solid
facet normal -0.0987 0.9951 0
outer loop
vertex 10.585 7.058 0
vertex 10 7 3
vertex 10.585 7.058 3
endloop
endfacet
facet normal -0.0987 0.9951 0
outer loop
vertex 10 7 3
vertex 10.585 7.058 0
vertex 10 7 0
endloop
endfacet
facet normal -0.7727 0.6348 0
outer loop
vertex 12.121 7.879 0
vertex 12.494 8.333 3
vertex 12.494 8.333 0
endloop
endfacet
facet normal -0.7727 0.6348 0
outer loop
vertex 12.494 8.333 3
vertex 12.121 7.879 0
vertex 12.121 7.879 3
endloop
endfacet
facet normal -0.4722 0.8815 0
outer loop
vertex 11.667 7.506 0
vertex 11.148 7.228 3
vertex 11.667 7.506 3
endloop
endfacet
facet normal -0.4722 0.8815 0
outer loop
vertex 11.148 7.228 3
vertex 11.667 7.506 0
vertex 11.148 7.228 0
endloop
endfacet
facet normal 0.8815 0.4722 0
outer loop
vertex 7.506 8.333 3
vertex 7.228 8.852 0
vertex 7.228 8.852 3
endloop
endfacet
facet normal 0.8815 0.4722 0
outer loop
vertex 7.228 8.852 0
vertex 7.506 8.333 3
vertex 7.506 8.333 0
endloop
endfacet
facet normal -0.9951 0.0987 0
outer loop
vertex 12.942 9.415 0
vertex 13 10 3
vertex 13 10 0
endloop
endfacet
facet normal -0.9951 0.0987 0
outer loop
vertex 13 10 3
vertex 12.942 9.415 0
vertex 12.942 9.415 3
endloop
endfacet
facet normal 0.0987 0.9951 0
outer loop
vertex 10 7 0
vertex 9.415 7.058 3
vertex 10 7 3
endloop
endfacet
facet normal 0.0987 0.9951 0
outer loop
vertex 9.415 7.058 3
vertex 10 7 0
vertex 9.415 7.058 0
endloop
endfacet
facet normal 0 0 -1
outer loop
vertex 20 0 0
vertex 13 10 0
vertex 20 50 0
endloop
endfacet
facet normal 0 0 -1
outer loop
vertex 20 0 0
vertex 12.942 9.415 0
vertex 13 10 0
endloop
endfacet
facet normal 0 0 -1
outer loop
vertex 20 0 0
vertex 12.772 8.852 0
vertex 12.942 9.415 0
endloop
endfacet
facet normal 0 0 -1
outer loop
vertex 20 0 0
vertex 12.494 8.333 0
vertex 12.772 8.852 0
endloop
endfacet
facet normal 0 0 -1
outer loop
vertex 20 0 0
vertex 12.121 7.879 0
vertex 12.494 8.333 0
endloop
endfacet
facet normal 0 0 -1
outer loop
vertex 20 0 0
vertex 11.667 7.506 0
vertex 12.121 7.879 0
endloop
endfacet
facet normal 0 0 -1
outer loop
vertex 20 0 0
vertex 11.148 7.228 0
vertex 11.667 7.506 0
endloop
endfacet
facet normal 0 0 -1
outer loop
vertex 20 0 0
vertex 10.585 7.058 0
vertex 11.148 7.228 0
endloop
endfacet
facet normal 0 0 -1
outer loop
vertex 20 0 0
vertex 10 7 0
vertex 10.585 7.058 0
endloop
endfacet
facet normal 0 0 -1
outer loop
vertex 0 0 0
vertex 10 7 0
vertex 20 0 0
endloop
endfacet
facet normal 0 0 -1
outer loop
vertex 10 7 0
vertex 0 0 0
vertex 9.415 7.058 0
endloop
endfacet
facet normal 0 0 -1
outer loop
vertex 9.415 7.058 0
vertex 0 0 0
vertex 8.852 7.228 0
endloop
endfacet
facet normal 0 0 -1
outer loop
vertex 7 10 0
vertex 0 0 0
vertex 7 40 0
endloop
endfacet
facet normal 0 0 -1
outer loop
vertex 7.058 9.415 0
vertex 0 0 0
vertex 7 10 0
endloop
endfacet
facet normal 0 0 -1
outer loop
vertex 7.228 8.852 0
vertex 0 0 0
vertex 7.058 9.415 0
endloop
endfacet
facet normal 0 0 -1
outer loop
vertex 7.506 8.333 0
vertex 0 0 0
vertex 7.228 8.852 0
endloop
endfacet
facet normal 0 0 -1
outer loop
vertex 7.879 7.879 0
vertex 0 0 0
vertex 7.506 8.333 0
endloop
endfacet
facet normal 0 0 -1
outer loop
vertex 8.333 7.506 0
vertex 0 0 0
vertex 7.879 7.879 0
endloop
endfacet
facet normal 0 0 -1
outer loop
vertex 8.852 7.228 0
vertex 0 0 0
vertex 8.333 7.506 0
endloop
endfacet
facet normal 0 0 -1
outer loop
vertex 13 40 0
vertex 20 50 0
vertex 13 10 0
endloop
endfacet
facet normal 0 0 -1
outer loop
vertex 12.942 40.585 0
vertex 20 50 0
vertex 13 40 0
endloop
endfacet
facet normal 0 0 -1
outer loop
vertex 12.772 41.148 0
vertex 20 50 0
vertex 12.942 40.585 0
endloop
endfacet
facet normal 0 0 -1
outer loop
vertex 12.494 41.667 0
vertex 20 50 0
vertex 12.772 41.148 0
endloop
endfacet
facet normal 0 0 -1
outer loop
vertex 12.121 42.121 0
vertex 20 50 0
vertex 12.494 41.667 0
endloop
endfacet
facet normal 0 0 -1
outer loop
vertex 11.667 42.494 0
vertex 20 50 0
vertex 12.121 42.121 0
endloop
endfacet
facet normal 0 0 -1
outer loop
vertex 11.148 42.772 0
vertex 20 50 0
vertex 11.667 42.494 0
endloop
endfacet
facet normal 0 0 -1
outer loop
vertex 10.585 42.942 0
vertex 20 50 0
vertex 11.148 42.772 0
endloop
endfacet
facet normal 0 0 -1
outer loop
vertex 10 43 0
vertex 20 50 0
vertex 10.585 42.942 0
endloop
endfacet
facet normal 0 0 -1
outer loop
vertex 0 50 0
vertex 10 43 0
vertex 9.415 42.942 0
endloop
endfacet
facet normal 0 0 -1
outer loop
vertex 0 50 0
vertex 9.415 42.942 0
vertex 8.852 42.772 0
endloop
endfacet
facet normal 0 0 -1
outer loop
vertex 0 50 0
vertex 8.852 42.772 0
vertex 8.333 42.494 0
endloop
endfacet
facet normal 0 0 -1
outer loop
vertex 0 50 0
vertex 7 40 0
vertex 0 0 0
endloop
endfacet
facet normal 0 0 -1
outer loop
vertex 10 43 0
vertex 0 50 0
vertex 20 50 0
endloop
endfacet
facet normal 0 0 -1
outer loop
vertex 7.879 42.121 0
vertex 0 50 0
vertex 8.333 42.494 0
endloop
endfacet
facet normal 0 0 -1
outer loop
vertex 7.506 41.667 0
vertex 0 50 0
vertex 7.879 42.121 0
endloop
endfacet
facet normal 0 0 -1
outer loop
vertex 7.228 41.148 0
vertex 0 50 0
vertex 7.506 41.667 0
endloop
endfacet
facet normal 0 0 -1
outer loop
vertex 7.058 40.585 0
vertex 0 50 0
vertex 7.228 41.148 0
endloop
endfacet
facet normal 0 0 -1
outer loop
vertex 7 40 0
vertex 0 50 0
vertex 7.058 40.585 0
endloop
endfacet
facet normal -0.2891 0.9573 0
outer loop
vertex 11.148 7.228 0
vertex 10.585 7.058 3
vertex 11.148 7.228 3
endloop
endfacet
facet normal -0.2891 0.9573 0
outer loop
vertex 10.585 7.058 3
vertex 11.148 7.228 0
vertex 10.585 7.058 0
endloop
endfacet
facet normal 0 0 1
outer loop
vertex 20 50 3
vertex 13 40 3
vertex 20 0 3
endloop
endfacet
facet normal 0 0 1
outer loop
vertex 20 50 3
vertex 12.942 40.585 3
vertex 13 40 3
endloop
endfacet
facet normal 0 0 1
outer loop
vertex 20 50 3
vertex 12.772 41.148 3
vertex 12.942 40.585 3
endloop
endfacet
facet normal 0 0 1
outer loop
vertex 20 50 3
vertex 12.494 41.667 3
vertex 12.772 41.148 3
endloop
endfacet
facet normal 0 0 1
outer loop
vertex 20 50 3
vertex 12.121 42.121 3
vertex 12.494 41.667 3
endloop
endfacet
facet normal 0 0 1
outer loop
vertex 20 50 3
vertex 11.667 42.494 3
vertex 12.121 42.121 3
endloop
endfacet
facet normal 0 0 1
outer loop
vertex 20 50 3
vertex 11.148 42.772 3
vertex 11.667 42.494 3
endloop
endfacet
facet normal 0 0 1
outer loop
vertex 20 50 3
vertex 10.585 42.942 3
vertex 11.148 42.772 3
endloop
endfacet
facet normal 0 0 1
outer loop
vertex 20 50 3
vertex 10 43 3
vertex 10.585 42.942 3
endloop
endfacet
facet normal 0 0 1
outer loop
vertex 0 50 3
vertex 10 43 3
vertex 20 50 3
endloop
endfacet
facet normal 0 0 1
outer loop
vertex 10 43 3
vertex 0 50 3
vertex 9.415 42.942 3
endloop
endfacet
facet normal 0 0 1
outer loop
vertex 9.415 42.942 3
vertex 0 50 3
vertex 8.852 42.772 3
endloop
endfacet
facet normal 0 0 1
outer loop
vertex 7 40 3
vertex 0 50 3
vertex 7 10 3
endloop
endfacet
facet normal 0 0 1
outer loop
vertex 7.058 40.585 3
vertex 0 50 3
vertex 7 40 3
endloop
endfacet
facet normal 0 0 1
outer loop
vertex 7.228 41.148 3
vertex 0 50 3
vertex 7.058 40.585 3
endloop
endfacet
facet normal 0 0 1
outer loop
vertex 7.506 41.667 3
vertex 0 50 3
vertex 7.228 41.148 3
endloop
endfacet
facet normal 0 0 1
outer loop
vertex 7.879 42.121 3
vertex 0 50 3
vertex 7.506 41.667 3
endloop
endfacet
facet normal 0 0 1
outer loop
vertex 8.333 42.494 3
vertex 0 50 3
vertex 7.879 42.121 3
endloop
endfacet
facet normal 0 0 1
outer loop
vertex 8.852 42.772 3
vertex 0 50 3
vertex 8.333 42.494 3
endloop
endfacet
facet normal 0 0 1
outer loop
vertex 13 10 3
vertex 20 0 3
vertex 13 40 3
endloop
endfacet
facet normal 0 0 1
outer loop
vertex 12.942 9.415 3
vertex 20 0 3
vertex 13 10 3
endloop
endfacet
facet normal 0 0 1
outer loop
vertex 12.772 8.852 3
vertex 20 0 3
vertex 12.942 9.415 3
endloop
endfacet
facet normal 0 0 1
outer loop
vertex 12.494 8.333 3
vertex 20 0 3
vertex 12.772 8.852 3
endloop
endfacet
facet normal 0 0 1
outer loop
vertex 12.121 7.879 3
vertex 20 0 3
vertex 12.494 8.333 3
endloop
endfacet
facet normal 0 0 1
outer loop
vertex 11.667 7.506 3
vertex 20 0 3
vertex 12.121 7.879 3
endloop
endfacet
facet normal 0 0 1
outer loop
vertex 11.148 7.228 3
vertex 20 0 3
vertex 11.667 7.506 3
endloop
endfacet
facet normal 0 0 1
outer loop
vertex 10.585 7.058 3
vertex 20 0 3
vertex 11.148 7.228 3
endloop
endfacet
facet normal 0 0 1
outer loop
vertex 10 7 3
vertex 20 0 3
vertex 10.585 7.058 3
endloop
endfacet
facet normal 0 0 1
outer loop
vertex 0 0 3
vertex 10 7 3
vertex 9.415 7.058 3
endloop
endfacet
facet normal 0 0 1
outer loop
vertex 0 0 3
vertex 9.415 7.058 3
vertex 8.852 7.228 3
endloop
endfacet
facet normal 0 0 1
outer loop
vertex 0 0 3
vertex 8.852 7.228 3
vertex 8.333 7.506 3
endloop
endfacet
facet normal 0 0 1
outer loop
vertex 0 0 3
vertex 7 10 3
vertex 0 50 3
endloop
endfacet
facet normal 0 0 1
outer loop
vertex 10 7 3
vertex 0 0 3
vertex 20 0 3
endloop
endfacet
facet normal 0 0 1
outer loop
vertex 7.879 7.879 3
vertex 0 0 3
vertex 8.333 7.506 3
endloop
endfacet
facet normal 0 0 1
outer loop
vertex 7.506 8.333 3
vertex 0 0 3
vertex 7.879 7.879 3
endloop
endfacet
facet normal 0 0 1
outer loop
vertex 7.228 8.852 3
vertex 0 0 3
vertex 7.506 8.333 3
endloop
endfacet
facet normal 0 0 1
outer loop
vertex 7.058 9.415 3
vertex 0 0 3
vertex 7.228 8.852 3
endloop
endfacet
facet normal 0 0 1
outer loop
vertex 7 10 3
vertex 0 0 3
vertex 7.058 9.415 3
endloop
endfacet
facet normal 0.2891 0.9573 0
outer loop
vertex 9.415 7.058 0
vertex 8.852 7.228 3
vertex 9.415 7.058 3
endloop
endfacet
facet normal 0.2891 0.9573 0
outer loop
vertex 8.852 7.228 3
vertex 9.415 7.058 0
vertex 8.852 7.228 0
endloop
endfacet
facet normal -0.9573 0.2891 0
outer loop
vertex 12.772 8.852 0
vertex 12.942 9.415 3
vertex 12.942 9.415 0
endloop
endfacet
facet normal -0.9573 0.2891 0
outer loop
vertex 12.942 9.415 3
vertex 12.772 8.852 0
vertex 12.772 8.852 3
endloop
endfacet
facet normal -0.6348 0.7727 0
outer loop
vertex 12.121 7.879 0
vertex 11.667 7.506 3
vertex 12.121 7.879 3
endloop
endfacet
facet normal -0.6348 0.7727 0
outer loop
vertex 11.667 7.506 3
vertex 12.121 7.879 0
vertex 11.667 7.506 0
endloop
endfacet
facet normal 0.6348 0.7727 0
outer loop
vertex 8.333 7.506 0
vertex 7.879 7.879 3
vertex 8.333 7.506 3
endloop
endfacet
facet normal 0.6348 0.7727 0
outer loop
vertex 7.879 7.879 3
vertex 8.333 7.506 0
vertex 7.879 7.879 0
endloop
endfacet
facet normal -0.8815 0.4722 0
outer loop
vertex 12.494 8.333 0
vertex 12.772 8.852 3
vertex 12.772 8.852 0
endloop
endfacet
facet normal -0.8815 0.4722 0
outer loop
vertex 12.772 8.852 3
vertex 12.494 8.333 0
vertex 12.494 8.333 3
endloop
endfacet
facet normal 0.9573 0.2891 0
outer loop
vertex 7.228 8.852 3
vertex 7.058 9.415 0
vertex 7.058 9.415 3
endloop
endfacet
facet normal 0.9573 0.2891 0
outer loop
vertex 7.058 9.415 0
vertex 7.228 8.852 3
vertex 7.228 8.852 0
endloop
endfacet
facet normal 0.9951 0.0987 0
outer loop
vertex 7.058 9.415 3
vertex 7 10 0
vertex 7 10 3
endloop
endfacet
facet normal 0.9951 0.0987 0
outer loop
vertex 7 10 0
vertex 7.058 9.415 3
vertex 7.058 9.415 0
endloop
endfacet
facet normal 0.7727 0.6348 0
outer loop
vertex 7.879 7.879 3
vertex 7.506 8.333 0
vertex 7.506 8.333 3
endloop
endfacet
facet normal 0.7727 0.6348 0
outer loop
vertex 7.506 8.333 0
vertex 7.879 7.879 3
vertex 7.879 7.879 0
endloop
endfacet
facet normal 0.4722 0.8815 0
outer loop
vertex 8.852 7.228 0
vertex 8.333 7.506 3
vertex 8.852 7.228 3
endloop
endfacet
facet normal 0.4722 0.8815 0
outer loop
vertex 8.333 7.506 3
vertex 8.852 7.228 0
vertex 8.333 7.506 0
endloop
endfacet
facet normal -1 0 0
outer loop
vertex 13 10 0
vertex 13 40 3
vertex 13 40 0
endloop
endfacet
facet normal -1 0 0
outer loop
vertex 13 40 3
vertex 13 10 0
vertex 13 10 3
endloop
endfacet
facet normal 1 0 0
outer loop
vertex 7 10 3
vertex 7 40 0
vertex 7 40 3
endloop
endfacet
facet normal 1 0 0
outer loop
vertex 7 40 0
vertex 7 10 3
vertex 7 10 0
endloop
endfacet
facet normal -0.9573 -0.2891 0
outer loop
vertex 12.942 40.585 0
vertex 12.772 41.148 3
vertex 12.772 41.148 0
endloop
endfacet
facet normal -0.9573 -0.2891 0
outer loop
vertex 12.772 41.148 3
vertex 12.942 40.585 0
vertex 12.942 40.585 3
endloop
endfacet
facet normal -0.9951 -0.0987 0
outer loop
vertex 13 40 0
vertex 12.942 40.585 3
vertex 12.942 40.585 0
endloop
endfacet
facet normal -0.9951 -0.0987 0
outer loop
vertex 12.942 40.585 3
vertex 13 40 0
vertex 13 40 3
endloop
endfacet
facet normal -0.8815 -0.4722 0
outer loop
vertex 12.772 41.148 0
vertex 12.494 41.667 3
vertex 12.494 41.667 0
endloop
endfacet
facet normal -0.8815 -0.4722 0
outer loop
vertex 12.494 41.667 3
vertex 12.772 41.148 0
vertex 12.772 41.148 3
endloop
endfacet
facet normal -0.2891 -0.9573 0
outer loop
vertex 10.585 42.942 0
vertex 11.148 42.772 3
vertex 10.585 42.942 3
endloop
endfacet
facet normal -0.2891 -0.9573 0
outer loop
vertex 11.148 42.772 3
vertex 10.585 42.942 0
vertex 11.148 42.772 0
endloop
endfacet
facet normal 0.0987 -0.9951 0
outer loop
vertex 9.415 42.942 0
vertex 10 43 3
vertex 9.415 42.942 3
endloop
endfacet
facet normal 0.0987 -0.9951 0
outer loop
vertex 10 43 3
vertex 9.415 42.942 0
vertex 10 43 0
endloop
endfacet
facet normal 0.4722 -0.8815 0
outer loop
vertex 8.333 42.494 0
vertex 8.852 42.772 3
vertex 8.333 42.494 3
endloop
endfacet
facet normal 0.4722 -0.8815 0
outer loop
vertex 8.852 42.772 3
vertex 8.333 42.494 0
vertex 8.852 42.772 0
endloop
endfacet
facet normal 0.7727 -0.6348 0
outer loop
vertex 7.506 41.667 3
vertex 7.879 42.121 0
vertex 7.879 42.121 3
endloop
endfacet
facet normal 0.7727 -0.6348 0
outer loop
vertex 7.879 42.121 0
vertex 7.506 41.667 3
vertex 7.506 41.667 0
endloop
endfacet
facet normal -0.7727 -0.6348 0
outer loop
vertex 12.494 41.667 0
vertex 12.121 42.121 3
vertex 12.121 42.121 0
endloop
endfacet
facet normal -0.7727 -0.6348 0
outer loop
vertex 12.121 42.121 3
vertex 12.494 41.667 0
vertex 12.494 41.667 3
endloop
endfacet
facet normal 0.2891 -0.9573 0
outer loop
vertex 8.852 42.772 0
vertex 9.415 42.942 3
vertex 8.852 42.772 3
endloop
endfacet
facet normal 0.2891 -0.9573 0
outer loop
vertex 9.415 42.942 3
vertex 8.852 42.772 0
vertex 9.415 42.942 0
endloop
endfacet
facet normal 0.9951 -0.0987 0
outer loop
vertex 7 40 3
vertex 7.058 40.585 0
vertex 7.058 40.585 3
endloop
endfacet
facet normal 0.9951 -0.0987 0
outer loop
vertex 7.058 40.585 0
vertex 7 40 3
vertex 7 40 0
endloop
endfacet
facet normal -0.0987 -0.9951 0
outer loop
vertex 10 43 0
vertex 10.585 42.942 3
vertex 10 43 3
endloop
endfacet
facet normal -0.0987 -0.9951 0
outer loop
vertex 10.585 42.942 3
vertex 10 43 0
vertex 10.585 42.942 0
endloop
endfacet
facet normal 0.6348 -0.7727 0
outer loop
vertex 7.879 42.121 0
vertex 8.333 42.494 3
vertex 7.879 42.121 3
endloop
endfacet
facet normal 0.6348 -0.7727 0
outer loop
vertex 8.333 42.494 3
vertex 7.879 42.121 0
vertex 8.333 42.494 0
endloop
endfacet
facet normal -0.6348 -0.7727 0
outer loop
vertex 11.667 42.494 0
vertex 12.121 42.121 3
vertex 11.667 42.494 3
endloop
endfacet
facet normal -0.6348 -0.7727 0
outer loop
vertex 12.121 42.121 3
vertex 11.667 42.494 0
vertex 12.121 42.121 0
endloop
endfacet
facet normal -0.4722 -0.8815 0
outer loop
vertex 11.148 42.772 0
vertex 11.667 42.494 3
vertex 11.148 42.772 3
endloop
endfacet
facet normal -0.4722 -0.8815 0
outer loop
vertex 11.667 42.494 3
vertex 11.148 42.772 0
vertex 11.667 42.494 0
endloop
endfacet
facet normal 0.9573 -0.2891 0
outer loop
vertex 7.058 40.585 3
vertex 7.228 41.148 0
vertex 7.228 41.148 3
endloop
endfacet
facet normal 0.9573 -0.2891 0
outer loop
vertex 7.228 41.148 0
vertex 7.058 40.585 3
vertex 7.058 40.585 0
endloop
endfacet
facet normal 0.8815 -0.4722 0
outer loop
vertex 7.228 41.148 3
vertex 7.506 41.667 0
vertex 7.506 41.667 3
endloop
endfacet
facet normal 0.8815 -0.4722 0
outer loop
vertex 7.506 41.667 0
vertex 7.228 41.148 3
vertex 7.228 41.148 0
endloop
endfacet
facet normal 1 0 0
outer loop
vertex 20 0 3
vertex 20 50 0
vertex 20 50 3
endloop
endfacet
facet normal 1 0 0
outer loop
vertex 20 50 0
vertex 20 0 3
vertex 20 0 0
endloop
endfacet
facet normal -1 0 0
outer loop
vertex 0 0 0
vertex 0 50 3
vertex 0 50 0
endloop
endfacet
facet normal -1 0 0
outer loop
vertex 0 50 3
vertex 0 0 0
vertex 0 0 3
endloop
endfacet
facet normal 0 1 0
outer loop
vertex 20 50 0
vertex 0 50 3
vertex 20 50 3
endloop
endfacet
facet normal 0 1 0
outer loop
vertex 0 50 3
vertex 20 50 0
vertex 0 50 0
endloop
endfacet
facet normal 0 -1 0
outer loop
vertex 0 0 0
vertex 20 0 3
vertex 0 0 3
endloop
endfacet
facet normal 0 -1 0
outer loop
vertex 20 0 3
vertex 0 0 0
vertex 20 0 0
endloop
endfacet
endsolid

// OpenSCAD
$fn = 32;

difference() {
    cube([20,50,3]);
    translate([10,10,0]) {
        cylinder(d=6,h=3);
        translate([-3,0,0]) {
            cube([6,30,3]);
        }
        translate([0,30,0]) {
            cylinder(d=6,h=3);
        }
    }
}
